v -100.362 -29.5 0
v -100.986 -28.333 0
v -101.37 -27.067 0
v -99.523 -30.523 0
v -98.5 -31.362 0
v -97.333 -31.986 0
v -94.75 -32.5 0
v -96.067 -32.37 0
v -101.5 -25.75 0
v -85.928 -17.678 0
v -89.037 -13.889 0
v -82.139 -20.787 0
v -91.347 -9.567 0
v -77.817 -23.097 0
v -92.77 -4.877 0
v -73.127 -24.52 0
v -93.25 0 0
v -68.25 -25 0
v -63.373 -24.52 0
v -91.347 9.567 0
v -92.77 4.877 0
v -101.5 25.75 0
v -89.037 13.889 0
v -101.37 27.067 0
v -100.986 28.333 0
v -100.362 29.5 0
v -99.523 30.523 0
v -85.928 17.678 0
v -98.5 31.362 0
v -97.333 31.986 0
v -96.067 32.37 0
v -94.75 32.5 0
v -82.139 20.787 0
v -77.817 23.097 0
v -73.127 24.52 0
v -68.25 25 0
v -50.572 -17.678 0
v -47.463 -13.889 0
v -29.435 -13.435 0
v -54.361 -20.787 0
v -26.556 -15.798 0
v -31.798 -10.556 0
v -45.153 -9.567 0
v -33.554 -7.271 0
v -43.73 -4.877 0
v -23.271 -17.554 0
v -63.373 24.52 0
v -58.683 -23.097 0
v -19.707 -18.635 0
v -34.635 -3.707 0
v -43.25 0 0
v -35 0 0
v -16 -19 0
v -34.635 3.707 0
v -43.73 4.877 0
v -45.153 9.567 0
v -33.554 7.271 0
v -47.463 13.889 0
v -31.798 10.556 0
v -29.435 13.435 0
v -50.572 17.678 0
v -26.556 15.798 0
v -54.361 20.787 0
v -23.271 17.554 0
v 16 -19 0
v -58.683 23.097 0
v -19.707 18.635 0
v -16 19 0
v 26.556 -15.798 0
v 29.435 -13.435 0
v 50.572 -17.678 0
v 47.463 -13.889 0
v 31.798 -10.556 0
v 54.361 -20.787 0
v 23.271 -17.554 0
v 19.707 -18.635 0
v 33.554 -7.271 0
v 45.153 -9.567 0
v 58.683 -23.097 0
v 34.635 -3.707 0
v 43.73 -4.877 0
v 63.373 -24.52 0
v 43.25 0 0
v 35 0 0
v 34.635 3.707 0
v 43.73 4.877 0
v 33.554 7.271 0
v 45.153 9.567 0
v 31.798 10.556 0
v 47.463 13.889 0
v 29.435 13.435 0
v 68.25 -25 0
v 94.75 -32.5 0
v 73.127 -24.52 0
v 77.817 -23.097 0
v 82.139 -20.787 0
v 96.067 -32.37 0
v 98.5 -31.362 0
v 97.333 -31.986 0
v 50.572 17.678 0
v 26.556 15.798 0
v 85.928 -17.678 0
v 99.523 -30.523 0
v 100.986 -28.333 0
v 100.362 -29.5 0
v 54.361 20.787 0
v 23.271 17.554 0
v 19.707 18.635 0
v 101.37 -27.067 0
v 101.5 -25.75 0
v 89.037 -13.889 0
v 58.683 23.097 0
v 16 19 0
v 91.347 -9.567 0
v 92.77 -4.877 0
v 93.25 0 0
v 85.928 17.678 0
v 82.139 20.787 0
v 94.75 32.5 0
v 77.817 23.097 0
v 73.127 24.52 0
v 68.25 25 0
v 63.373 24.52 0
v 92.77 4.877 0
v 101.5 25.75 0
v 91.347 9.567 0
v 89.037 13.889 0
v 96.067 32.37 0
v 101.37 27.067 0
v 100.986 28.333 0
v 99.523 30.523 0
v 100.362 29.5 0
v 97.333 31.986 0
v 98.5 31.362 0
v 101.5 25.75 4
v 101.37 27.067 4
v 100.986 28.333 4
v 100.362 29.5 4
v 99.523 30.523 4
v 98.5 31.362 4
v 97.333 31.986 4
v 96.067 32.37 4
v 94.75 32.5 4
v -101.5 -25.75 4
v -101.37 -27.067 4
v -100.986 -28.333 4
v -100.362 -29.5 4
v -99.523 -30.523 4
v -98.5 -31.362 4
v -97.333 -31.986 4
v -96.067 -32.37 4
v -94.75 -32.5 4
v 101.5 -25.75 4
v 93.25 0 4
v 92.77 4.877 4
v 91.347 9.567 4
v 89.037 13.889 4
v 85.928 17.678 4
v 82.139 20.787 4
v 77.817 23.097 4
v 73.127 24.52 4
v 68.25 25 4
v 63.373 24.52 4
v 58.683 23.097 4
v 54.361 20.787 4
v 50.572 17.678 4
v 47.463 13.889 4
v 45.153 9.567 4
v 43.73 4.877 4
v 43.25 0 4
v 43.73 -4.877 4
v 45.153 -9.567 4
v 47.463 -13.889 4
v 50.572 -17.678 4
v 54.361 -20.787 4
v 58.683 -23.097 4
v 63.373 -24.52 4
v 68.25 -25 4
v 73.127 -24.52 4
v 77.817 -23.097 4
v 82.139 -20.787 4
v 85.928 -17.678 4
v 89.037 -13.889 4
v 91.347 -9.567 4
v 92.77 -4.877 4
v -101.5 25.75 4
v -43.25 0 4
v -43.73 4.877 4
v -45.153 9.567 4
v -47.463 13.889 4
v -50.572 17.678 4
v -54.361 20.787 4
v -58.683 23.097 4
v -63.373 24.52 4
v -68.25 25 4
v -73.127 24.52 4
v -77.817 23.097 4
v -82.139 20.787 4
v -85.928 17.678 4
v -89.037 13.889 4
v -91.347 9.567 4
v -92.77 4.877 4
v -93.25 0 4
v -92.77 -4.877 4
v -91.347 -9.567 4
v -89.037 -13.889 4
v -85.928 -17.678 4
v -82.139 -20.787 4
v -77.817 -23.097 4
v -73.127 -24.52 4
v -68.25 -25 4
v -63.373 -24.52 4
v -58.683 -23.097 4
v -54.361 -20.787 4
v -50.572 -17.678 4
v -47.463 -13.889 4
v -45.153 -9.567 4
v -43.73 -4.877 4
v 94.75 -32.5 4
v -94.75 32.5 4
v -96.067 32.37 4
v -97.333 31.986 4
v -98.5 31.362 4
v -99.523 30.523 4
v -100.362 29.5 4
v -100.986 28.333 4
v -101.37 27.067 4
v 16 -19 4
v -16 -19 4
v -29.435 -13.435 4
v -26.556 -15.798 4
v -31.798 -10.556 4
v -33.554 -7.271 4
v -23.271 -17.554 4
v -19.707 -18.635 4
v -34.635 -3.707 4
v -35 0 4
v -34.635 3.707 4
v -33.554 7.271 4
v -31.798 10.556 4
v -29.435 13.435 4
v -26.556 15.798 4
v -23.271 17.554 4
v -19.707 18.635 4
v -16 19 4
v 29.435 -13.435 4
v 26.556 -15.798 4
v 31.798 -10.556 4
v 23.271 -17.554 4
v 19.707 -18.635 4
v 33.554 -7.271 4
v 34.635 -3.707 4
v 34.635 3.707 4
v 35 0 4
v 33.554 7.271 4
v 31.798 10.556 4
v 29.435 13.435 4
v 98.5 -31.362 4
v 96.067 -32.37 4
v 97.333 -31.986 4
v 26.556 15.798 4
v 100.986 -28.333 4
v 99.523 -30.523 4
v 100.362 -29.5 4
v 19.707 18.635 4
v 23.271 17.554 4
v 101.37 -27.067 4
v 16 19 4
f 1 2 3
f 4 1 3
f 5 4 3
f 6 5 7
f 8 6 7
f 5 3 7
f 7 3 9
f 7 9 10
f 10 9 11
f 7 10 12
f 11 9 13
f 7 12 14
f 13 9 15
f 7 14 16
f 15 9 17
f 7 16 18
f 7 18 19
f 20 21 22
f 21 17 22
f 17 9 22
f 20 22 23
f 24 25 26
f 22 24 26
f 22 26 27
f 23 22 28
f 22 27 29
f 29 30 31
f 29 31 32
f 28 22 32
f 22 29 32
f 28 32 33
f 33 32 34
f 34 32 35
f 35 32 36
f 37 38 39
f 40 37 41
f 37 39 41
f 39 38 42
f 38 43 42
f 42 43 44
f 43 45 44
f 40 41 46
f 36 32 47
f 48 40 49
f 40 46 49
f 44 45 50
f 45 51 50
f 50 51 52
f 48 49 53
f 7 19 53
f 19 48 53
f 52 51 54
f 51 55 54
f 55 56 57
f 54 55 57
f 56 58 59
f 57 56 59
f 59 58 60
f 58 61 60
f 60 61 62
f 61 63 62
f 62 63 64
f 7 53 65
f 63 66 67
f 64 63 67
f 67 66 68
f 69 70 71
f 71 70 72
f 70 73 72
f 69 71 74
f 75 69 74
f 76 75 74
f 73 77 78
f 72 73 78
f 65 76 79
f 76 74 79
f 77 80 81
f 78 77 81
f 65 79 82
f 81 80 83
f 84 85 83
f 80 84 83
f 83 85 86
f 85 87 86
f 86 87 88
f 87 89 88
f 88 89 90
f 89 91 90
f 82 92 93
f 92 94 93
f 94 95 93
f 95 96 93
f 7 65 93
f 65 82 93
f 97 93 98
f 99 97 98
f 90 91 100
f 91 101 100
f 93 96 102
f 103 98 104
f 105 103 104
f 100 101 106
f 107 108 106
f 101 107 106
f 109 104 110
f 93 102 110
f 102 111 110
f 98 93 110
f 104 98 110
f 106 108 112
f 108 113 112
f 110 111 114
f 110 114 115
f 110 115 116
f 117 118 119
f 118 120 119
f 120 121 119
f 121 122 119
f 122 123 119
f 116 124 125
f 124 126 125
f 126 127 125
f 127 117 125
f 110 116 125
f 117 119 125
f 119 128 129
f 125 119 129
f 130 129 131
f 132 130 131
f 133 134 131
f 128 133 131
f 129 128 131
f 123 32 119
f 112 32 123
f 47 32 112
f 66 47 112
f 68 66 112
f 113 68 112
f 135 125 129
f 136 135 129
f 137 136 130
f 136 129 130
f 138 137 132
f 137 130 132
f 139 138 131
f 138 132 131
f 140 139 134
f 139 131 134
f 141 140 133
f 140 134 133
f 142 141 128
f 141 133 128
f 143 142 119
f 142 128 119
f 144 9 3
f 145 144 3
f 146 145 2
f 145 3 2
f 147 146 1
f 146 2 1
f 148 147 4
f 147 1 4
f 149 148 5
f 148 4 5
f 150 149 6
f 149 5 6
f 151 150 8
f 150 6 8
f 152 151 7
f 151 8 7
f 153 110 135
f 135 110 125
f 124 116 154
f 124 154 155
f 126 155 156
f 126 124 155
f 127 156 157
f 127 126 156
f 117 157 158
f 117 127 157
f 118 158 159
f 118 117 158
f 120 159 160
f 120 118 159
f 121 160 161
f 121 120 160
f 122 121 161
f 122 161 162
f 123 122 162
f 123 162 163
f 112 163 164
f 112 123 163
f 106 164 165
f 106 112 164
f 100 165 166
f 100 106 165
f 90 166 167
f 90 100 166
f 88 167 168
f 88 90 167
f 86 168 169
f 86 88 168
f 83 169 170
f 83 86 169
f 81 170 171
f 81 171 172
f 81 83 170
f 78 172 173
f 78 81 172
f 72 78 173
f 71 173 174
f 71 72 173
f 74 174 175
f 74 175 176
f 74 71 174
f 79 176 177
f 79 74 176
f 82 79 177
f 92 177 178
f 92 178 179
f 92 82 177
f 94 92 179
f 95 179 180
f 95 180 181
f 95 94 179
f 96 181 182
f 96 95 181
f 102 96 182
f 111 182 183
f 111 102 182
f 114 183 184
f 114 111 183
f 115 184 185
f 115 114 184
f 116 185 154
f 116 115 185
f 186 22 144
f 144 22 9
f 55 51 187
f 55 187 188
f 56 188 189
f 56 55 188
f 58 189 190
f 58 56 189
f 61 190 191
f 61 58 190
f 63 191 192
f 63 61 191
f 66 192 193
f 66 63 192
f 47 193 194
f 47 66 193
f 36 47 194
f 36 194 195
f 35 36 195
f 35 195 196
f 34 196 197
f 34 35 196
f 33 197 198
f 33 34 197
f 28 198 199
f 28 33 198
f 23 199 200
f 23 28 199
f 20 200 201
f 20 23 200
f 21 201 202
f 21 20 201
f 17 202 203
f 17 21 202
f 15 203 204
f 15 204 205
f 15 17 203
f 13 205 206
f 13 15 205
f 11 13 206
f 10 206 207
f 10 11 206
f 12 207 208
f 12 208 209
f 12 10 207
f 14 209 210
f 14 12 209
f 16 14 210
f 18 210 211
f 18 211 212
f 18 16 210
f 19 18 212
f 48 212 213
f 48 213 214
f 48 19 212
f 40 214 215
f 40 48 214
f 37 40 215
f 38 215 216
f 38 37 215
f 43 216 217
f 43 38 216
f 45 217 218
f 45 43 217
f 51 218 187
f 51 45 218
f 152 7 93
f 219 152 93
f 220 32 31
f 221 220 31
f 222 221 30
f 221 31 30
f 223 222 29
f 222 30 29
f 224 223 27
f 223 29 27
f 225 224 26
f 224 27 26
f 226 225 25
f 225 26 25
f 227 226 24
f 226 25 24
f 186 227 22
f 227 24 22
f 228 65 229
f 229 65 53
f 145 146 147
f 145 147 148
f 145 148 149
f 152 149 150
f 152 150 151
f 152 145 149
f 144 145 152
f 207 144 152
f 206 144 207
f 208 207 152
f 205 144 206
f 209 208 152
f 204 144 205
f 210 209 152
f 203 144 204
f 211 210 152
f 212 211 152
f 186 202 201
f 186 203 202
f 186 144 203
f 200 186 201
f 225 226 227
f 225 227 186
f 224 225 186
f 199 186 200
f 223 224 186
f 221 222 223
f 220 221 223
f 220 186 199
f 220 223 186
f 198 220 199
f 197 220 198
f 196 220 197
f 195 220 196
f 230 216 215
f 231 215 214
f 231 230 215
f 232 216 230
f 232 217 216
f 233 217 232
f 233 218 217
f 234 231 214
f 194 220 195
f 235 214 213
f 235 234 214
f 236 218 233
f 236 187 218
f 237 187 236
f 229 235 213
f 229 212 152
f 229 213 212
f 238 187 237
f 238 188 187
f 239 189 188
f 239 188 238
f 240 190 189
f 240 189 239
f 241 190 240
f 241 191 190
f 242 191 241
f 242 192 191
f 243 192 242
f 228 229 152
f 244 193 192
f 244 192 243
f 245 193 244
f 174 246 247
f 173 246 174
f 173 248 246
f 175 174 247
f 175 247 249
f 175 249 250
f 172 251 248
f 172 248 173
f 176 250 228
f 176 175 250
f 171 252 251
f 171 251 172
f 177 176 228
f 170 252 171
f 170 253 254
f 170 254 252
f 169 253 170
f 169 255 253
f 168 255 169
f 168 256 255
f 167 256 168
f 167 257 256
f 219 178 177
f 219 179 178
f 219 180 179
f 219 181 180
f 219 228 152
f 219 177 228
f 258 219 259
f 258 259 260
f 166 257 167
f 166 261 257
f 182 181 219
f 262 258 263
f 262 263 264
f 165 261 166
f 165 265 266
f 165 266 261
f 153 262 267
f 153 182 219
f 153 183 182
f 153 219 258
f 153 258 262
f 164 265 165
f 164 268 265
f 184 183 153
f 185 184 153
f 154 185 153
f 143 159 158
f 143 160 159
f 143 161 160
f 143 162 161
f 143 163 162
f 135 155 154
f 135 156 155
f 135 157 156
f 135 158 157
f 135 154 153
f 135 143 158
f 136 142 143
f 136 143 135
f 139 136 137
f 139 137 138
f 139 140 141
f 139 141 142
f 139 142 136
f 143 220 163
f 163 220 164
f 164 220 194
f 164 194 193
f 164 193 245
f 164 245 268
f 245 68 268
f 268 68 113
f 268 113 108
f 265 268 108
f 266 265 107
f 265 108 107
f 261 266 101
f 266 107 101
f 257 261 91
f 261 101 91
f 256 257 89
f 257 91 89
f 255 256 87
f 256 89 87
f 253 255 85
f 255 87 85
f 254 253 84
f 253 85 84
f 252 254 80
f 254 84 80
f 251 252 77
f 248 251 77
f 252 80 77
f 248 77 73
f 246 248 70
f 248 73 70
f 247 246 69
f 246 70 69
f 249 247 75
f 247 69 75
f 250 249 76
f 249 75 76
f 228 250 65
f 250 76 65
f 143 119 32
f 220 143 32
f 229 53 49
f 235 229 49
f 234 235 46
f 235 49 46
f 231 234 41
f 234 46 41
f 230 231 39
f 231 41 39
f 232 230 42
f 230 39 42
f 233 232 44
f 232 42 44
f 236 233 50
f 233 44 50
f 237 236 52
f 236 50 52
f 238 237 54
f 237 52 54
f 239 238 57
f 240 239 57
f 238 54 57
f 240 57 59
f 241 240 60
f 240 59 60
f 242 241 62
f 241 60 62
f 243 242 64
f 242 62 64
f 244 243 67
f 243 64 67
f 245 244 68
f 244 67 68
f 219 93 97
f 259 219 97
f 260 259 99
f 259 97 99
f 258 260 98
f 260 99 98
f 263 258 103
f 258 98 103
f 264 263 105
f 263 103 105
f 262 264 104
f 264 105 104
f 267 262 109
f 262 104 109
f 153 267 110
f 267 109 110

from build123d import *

# Parameters (mm, degrees)
F0_R     = 25
F1_DEPTH = 4


with BuildPart() as f1:
    # F0 (on Top) → F1 (new body)
    with BuildSketch(Plane.XY):
        with BuildLine():
            Line((-94.75, -32.5), (94.75, -32.5))
            ThreePointArc((94.75, -32.5), (99.522971, -30.522971), (101.5, -25.75))
            Line((101.5, -25.75), (101.5, 25.75))
            ThreePointArc((101.5, 25.75), (99.522971, 30.522971), (94.75, 32.5))
            Line((94.75, 32.5), (-94.75, 32.5))
            ThreePointArc((-94.75, 32.5), (-99.522971, 30.522971), (-101.5, 25.75))
            Line((-101.5, 25.75), (-101.5, -25.75))
            ThreePointArc((-101.5, -25.75), (-99.522971, -30.522971), (-94.75, -32.5))
        make_face()
        with Locations((-68.25, 0)):
            Circle(F0_R, mode=Mode.SUBTRACT)
        with BuildLine():
            ThreePointArc((16, 19), (35, 0), (16, -19))
            Line((16, -19), (-16, -19))
            ThreePointArc((-16, -19), (-35, 0), (-16, 19))
            Line((-16, 19), (16, 19))
        make_face(mode=Mode.SUBTRACT)
        with Locations((68.25, 0)):
            Circle(F0_R, mode=Mode.SUBTRACT)
    extrude(amount=F1_DEPTH)


solid = f1.part
